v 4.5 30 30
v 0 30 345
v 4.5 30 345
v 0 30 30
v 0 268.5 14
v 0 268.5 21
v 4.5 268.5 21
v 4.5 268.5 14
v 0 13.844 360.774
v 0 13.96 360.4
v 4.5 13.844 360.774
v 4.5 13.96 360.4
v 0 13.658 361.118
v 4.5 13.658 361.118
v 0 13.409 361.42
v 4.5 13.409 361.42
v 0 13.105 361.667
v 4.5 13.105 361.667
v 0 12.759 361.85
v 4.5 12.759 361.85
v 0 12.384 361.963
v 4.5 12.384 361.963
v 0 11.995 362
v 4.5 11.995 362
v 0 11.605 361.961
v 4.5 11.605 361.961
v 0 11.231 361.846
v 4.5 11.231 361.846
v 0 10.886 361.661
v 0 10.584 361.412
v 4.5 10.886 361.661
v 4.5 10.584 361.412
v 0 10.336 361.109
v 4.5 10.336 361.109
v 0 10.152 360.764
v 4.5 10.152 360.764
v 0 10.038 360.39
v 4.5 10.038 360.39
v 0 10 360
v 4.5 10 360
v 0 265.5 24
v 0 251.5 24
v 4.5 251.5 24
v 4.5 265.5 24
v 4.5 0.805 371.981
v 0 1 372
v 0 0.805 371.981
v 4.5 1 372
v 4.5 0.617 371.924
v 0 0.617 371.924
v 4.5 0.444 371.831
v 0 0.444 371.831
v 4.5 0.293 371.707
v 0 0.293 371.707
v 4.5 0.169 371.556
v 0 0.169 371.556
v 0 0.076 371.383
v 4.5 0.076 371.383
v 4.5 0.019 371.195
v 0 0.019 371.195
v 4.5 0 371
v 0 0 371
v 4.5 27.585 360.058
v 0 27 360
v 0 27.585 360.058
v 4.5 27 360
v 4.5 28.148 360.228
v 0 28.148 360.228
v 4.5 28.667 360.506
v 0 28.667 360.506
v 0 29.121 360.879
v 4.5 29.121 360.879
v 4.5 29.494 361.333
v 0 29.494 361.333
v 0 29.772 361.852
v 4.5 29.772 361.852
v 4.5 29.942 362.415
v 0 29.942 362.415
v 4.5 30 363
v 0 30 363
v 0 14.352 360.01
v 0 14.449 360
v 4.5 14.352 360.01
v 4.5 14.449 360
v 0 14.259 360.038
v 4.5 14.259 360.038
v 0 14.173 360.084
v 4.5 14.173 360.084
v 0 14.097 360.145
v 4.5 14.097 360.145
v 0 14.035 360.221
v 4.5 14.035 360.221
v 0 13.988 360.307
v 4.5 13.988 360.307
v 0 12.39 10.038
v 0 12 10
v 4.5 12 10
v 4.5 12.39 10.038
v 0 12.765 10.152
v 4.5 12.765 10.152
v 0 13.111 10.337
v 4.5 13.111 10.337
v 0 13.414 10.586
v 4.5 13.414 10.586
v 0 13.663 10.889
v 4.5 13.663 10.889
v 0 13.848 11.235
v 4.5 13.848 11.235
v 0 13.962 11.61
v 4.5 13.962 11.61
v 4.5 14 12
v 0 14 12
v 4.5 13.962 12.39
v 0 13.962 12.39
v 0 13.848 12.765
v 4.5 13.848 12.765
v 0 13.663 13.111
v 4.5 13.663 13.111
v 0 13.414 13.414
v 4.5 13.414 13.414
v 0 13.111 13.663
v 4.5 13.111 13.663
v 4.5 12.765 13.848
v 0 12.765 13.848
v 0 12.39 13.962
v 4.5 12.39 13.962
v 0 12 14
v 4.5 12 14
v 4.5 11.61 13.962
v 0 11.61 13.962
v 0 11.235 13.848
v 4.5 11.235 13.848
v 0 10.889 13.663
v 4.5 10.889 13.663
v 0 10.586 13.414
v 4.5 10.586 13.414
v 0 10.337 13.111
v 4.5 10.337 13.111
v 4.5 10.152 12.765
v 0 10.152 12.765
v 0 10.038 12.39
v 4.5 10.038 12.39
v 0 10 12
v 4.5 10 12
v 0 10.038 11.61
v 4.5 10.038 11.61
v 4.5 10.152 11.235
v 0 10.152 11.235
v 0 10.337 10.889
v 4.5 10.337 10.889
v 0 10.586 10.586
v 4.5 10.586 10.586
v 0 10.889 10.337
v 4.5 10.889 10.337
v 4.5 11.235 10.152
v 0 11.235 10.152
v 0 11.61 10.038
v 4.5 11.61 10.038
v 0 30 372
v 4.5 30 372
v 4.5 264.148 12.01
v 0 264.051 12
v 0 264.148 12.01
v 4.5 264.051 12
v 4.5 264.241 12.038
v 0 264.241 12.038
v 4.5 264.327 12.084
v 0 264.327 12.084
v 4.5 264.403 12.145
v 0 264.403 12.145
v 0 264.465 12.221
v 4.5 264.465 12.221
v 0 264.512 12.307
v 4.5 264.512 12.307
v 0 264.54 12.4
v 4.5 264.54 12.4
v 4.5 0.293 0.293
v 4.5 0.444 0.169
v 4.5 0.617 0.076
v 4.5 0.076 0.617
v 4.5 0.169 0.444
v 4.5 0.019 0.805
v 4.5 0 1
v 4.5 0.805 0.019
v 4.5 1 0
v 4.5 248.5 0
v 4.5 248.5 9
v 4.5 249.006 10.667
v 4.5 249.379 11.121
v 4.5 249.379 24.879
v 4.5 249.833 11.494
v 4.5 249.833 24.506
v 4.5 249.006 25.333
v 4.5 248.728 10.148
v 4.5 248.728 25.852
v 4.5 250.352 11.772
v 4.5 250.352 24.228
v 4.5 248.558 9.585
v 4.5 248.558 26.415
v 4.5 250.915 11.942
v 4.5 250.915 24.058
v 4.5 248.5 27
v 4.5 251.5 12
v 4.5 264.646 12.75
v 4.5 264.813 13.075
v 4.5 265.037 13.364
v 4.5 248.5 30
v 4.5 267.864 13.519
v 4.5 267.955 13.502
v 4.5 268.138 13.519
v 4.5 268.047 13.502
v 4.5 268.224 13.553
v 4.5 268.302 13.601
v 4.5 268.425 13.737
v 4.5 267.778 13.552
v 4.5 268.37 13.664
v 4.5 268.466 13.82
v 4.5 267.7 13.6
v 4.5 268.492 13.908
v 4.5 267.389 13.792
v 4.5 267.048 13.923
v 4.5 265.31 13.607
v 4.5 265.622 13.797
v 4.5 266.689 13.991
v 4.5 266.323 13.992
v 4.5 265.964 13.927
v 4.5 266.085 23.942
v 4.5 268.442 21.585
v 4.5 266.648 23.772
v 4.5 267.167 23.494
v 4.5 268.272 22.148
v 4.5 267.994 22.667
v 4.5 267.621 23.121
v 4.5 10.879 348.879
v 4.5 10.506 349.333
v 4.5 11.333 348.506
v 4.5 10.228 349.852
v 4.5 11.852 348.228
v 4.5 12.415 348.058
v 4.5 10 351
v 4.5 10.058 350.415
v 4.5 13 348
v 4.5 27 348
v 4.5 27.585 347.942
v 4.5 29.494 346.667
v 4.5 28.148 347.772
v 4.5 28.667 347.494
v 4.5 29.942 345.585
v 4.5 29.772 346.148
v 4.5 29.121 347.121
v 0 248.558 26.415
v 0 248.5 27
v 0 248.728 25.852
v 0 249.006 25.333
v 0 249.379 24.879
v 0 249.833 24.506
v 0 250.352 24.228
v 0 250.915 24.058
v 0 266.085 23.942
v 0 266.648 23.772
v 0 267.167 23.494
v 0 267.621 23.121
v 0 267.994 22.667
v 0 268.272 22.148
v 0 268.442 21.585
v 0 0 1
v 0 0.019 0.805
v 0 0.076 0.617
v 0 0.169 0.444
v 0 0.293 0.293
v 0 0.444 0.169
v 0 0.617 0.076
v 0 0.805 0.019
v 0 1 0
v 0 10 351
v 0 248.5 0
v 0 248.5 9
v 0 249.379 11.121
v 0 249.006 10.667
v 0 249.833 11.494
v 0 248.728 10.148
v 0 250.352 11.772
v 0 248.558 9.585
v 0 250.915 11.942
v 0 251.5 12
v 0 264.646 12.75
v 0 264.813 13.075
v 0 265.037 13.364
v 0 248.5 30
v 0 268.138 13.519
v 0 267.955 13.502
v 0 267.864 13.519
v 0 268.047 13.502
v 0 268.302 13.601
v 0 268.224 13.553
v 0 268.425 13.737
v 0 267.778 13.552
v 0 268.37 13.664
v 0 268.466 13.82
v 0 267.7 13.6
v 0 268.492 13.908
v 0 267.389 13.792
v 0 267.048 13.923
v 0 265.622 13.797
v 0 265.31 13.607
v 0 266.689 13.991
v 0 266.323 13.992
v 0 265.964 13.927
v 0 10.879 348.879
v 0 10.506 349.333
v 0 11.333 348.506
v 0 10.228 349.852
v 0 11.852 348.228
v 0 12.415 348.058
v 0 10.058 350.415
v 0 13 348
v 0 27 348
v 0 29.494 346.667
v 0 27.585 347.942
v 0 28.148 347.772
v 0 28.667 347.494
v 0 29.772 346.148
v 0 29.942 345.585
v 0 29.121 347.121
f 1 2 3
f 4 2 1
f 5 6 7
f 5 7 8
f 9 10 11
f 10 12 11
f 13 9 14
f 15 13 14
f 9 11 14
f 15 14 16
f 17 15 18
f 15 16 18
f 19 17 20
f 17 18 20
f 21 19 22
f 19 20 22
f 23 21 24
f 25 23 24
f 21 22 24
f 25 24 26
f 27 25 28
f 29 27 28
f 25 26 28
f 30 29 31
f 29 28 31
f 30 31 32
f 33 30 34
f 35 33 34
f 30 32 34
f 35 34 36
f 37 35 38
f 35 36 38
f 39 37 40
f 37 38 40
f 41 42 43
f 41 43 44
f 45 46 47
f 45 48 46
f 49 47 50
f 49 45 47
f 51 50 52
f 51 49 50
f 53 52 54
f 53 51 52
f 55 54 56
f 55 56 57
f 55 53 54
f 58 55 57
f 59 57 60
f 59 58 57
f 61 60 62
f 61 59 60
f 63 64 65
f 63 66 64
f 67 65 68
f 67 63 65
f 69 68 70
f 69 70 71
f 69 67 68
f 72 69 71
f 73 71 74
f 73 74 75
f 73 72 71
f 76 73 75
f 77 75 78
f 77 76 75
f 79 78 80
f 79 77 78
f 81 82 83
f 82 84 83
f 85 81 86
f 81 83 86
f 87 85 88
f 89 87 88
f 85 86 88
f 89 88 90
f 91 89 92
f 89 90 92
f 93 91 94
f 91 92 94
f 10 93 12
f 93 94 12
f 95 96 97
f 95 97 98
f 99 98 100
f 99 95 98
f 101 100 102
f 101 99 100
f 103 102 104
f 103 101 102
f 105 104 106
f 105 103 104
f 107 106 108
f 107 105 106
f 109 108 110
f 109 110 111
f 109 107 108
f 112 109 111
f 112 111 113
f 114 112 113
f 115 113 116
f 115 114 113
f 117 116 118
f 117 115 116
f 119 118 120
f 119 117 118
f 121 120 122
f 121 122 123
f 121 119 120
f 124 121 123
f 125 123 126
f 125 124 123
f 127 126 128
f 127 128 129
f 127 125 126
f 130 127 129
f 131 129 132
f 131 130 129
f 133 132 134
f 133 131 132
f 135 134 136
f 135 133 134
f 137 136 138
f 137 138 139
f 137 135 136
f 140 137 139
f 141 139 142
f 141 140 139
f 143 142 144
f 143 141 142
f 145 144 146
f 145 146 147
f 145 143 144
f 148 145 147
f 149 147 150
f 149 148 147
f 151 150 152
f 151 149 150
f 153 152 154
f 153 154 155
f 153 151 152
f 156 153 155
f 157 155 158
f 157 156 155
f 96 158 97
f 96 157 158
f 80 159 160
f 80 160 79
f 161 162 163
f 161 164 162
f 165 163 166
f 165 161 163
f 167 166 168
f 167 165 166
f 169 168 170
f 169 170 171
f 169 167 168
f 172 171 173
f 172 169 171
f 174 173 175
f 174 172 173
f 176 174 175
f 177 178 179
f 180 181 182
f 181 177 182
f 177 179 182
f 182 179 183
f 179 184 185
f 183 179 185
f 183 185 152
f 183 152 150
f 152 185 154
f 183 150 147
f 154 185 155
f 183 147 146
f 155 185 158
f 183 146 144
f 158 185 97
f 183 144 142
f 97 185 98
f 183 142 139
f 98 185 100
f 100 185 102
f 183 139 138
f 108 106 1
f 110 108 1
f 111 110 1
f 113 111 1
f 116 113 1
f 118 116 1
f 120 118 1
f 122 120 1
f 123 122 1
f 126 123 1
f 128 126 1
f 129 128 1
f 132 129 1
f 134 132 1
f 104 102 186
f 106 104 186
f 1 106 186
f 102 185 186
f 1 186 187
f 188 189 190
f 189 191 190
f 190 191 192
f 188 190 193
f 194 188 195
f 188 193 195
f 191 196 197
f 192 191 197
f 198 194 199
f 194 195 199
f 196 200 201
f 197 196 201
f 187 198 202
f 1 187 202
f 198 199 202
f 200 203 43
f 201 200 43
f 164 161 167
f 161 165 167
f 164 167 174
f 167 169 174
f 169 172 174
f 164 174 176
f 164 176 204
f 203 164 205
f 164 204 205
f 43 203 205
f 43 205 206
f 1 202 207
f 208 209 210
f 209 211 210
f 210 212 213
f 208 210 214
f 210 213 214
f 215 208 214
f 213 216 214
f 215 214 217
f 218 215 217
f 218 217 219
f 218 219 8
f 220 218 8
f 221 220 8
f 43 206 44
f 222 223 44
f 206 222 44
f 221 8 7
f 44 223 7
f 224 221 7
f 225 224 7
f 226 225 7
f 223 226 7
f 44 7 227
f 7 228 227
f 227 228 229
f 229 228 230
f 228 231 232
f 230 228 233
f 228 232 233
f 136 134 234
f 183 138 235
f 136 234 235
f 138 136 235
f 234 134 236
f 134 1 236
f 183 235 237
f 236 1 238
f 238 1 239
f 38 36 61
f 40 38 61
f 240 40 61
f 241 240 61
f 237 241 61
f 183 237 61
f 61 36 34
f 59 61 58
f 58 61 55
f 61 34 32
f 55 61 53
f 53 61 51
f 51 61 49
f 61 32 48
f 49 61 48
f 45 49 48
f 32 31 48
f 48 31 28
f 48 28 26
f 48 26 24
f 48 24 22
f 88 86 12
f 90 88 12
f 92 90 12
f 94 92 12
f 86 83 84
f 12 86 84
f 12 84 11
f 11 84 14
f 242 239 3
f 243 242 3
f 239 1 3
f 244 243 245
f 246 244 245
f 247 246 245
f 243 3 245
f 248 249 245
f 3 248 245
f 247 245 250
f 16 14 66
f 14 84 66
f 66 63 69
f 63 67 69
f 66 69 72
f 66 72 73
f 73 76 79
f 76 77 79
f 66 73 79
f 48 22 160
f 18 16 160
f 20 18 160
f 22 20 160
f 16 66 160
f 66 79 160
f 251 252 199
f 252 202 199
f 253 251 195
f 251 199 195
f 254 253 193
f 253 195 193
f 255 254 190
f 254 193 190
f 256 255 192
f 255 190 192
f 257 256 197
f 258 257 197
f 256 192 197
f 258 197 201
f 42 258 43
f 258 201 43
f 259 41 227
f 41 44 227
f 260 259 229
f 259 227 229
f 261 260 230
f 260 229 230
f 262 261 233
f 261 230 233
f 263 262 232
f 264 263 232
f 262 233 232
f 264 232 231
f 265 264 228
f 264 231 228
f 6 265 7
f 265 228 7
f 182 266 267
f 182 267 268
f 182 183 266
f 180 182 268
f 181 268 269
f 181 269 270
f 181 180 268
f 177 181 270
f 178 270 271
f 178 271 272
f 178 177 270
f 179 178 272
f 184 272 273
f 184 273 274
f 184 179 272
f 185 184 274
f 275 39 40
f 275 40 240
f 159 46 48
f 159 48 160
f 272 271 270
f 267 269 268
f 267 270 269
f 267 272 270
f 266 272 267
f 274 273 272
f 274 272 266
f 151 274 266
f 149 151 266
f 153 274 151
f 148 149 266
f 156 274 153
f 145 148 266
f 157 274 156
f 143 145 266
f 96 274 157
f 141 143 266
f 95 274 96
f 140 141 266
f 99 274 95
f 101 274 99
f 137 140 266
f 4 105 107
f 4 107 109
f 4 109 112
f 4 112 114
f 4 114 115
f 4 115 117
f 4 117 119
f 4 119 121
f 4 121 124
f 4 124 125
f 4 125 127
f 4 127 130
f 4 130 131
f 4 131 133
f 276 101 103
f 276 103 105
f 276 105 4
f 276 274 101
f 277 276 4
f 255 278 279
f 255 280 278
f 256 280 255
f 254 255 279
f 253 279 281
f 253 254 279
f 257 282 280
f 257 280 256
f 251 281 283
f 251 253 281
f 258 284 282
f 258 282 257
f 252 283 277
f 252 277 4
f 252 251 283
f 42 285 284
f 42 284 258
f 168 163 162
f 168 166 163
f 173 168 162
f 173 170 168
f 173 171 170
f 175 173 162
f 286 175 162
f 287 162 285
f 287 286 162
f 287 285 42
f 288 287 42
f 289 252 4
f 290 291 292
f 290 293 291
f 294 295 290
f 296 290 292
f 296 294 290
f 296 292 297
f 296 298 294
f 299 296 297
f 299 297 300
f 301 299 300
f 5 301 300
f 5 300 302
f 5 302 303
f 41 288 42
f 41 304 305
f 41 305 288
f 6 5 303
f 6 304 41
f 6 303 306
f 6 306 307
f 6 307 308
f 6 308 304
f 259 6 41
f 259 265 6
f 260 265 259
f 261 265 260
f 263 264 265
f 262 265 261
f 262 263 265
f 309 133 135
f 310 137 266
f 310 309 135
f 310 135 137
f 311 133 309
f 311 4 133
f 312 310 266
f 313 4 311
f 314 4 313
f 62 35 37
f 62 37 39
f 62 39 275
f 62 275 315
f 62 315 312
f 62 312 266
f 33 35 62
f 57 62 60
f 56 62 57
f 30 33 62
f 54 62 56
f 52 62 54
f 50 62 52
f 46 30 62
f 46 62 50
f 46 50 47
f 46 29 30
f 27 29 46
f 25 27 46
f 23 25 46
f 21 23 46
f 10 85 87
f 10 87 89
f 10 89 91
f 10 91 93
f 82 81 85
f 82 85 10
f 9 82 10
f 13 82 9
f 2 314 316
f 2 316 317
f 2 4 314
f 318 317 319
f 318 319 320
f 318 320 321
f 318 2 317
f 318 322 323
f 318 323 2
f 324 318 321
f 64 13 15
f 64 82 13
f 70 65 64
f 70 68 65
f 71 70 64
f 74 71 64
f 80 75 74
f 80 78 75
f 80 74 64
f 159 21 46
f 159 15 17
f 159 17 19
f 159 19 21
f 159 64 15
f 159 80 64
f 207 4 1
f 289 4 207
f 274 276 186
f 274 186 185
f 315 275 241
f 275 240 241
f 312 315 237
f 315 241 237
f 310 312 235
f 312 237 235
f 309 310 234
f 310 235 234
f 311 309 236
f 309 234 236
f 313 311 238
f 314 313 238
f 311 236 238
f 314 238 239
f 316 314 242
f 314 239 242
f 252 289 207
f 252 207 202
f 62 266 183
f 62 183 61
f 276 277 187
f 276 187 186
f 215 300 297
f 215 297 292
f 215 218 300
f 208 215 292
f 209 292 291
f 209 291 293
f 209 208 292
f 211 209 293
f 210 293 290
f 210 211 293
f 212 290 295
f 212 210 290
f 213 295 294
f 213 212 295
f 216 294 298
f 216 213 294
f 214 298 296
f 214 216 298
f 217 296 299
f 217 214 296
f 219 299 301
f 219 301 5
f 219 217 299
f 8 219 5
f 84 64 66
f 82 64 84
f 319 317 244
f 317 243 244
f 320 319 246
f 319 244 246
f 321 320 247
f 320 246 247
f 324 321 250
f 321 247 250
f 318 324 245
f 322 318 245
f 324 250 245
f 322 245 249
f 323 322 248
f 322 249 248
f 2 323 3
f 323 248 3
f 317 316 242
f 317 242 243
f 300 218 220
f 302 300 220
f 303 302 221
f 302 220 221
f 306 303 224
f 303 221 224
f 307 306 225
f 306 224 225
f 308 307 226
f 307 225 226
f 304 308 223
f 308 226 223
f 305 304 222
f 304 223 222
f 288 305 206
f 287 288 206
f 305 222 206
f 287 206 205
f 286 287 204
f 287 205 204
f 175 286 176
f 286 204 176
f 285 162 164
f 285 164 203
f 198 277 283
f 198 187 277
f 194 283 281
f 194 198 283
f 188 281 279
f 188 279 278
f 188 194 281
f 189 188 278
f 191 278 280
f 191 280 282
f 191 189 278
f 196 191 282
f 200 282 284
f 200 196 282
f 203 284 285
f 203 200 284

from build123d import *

# Parameters (mm, degrees)
SKETCH2_R           = 2
BOSS_EXTRUDE1_DEPTH = 4.5
SKETCH3_R           = 2
CUT_EXTRUDE1_DEPTH  = 459.798975587
FILLET2_R           = 0.5
FILLET4_R           = 0.5
FILLET5_R           = 0.5
FILLET6_R           = 3
FILLET7_R           = 3
FILLET8_R           = 1


with BuildPart() as part:
    # Sketch2 → Boss-Extrude1 (new body)
    with BuildSketch(Plane(origin=(0, 0, 0), x_dir=(0, 0, -1), z_dir=(1, 0, 0))):
        Polygon((-30, 30), (-30, 248.5), (-24, 248.5), (-24, 268.5), (-12, 268.5), (-12, 248.5), (0, 248.5), (0, 0), (-372, 0), (-372, 30), (-360, 30), (-360, 10), (-348, 10), (-348, 30), align=None)
        with Locations((-12, 12)):
            Circle(SKETCH2_R, mode=Mode.SUBTRACT)
    extrude(amount=BOSS_EXTRUDE1_DEPTH)

    # Sketch3 → Cut-Extrude1 (cut, through all)
    with BuildSketch(Plane(origin=(4.5, 0, 0), x_dir=(0, 0, -1), z_dir=(1, 0, 0))):
        with Locations((-12, 266.5)):
            Circle(SKETCH3_R)
        with Locations((-360, 12)):
            Circle(SKETCH3_R)
    extrude(amount=-CUT_EXTRUDE1_DEPTH, mode=Mode.SUBTRACT)

    # Fillet2
    fillet2_edges = [part.edges().sort_by_distance(p)[0] for p in [
        (2.25, 264.5, 12),
    ]]
    fillet(fillet2_edges, radius=FILLET2_R)

    # Fillet4
    fillet4_edges = [part.edges().sort_by_distance(p)[0] for p in [
        (2.25, 268.5, 12),
    ]]
    fillet(fillet4_edges, radius=FILLET4_R)

    # Fillet5
    fillet5_edges = [part.edges().sort_by_distance(p)[0] for p in [
        (2.25, 14, 360),
    ]]
    fillet(fillet5_edges, radius=FILLET5_R)

    # Fillet6
    fillet6_edges = [part.edges().sort_by_distance(p)[0] for p in [
        (2.25, 30, 360),
        (2.25, 30, 348),
        (2.25, 248.5, 24),
        (2.25, 248.5, 12),
    ]]
    fillet(fillet6_edges, radius=FILLET6_R)

    # Fillet7
    fillet7_edges = [part.edges().sort_by_distance(p)[0] for p in [
        (2.25, 10, 348),
        (2.25, 268.5, 24),
    ]]
    fillet(fillet7_edges, radius=FILLET7_R)

    # Fillet8
    fillet8_edges = [part.edges().sort_by_distance(p)[0] for p in [
        (2.25, 0, 0),
        (2.25, 0, 372),
    ]]
    fillet(fillet8_edges, radius=FILLET8_R)


solid = part.part
